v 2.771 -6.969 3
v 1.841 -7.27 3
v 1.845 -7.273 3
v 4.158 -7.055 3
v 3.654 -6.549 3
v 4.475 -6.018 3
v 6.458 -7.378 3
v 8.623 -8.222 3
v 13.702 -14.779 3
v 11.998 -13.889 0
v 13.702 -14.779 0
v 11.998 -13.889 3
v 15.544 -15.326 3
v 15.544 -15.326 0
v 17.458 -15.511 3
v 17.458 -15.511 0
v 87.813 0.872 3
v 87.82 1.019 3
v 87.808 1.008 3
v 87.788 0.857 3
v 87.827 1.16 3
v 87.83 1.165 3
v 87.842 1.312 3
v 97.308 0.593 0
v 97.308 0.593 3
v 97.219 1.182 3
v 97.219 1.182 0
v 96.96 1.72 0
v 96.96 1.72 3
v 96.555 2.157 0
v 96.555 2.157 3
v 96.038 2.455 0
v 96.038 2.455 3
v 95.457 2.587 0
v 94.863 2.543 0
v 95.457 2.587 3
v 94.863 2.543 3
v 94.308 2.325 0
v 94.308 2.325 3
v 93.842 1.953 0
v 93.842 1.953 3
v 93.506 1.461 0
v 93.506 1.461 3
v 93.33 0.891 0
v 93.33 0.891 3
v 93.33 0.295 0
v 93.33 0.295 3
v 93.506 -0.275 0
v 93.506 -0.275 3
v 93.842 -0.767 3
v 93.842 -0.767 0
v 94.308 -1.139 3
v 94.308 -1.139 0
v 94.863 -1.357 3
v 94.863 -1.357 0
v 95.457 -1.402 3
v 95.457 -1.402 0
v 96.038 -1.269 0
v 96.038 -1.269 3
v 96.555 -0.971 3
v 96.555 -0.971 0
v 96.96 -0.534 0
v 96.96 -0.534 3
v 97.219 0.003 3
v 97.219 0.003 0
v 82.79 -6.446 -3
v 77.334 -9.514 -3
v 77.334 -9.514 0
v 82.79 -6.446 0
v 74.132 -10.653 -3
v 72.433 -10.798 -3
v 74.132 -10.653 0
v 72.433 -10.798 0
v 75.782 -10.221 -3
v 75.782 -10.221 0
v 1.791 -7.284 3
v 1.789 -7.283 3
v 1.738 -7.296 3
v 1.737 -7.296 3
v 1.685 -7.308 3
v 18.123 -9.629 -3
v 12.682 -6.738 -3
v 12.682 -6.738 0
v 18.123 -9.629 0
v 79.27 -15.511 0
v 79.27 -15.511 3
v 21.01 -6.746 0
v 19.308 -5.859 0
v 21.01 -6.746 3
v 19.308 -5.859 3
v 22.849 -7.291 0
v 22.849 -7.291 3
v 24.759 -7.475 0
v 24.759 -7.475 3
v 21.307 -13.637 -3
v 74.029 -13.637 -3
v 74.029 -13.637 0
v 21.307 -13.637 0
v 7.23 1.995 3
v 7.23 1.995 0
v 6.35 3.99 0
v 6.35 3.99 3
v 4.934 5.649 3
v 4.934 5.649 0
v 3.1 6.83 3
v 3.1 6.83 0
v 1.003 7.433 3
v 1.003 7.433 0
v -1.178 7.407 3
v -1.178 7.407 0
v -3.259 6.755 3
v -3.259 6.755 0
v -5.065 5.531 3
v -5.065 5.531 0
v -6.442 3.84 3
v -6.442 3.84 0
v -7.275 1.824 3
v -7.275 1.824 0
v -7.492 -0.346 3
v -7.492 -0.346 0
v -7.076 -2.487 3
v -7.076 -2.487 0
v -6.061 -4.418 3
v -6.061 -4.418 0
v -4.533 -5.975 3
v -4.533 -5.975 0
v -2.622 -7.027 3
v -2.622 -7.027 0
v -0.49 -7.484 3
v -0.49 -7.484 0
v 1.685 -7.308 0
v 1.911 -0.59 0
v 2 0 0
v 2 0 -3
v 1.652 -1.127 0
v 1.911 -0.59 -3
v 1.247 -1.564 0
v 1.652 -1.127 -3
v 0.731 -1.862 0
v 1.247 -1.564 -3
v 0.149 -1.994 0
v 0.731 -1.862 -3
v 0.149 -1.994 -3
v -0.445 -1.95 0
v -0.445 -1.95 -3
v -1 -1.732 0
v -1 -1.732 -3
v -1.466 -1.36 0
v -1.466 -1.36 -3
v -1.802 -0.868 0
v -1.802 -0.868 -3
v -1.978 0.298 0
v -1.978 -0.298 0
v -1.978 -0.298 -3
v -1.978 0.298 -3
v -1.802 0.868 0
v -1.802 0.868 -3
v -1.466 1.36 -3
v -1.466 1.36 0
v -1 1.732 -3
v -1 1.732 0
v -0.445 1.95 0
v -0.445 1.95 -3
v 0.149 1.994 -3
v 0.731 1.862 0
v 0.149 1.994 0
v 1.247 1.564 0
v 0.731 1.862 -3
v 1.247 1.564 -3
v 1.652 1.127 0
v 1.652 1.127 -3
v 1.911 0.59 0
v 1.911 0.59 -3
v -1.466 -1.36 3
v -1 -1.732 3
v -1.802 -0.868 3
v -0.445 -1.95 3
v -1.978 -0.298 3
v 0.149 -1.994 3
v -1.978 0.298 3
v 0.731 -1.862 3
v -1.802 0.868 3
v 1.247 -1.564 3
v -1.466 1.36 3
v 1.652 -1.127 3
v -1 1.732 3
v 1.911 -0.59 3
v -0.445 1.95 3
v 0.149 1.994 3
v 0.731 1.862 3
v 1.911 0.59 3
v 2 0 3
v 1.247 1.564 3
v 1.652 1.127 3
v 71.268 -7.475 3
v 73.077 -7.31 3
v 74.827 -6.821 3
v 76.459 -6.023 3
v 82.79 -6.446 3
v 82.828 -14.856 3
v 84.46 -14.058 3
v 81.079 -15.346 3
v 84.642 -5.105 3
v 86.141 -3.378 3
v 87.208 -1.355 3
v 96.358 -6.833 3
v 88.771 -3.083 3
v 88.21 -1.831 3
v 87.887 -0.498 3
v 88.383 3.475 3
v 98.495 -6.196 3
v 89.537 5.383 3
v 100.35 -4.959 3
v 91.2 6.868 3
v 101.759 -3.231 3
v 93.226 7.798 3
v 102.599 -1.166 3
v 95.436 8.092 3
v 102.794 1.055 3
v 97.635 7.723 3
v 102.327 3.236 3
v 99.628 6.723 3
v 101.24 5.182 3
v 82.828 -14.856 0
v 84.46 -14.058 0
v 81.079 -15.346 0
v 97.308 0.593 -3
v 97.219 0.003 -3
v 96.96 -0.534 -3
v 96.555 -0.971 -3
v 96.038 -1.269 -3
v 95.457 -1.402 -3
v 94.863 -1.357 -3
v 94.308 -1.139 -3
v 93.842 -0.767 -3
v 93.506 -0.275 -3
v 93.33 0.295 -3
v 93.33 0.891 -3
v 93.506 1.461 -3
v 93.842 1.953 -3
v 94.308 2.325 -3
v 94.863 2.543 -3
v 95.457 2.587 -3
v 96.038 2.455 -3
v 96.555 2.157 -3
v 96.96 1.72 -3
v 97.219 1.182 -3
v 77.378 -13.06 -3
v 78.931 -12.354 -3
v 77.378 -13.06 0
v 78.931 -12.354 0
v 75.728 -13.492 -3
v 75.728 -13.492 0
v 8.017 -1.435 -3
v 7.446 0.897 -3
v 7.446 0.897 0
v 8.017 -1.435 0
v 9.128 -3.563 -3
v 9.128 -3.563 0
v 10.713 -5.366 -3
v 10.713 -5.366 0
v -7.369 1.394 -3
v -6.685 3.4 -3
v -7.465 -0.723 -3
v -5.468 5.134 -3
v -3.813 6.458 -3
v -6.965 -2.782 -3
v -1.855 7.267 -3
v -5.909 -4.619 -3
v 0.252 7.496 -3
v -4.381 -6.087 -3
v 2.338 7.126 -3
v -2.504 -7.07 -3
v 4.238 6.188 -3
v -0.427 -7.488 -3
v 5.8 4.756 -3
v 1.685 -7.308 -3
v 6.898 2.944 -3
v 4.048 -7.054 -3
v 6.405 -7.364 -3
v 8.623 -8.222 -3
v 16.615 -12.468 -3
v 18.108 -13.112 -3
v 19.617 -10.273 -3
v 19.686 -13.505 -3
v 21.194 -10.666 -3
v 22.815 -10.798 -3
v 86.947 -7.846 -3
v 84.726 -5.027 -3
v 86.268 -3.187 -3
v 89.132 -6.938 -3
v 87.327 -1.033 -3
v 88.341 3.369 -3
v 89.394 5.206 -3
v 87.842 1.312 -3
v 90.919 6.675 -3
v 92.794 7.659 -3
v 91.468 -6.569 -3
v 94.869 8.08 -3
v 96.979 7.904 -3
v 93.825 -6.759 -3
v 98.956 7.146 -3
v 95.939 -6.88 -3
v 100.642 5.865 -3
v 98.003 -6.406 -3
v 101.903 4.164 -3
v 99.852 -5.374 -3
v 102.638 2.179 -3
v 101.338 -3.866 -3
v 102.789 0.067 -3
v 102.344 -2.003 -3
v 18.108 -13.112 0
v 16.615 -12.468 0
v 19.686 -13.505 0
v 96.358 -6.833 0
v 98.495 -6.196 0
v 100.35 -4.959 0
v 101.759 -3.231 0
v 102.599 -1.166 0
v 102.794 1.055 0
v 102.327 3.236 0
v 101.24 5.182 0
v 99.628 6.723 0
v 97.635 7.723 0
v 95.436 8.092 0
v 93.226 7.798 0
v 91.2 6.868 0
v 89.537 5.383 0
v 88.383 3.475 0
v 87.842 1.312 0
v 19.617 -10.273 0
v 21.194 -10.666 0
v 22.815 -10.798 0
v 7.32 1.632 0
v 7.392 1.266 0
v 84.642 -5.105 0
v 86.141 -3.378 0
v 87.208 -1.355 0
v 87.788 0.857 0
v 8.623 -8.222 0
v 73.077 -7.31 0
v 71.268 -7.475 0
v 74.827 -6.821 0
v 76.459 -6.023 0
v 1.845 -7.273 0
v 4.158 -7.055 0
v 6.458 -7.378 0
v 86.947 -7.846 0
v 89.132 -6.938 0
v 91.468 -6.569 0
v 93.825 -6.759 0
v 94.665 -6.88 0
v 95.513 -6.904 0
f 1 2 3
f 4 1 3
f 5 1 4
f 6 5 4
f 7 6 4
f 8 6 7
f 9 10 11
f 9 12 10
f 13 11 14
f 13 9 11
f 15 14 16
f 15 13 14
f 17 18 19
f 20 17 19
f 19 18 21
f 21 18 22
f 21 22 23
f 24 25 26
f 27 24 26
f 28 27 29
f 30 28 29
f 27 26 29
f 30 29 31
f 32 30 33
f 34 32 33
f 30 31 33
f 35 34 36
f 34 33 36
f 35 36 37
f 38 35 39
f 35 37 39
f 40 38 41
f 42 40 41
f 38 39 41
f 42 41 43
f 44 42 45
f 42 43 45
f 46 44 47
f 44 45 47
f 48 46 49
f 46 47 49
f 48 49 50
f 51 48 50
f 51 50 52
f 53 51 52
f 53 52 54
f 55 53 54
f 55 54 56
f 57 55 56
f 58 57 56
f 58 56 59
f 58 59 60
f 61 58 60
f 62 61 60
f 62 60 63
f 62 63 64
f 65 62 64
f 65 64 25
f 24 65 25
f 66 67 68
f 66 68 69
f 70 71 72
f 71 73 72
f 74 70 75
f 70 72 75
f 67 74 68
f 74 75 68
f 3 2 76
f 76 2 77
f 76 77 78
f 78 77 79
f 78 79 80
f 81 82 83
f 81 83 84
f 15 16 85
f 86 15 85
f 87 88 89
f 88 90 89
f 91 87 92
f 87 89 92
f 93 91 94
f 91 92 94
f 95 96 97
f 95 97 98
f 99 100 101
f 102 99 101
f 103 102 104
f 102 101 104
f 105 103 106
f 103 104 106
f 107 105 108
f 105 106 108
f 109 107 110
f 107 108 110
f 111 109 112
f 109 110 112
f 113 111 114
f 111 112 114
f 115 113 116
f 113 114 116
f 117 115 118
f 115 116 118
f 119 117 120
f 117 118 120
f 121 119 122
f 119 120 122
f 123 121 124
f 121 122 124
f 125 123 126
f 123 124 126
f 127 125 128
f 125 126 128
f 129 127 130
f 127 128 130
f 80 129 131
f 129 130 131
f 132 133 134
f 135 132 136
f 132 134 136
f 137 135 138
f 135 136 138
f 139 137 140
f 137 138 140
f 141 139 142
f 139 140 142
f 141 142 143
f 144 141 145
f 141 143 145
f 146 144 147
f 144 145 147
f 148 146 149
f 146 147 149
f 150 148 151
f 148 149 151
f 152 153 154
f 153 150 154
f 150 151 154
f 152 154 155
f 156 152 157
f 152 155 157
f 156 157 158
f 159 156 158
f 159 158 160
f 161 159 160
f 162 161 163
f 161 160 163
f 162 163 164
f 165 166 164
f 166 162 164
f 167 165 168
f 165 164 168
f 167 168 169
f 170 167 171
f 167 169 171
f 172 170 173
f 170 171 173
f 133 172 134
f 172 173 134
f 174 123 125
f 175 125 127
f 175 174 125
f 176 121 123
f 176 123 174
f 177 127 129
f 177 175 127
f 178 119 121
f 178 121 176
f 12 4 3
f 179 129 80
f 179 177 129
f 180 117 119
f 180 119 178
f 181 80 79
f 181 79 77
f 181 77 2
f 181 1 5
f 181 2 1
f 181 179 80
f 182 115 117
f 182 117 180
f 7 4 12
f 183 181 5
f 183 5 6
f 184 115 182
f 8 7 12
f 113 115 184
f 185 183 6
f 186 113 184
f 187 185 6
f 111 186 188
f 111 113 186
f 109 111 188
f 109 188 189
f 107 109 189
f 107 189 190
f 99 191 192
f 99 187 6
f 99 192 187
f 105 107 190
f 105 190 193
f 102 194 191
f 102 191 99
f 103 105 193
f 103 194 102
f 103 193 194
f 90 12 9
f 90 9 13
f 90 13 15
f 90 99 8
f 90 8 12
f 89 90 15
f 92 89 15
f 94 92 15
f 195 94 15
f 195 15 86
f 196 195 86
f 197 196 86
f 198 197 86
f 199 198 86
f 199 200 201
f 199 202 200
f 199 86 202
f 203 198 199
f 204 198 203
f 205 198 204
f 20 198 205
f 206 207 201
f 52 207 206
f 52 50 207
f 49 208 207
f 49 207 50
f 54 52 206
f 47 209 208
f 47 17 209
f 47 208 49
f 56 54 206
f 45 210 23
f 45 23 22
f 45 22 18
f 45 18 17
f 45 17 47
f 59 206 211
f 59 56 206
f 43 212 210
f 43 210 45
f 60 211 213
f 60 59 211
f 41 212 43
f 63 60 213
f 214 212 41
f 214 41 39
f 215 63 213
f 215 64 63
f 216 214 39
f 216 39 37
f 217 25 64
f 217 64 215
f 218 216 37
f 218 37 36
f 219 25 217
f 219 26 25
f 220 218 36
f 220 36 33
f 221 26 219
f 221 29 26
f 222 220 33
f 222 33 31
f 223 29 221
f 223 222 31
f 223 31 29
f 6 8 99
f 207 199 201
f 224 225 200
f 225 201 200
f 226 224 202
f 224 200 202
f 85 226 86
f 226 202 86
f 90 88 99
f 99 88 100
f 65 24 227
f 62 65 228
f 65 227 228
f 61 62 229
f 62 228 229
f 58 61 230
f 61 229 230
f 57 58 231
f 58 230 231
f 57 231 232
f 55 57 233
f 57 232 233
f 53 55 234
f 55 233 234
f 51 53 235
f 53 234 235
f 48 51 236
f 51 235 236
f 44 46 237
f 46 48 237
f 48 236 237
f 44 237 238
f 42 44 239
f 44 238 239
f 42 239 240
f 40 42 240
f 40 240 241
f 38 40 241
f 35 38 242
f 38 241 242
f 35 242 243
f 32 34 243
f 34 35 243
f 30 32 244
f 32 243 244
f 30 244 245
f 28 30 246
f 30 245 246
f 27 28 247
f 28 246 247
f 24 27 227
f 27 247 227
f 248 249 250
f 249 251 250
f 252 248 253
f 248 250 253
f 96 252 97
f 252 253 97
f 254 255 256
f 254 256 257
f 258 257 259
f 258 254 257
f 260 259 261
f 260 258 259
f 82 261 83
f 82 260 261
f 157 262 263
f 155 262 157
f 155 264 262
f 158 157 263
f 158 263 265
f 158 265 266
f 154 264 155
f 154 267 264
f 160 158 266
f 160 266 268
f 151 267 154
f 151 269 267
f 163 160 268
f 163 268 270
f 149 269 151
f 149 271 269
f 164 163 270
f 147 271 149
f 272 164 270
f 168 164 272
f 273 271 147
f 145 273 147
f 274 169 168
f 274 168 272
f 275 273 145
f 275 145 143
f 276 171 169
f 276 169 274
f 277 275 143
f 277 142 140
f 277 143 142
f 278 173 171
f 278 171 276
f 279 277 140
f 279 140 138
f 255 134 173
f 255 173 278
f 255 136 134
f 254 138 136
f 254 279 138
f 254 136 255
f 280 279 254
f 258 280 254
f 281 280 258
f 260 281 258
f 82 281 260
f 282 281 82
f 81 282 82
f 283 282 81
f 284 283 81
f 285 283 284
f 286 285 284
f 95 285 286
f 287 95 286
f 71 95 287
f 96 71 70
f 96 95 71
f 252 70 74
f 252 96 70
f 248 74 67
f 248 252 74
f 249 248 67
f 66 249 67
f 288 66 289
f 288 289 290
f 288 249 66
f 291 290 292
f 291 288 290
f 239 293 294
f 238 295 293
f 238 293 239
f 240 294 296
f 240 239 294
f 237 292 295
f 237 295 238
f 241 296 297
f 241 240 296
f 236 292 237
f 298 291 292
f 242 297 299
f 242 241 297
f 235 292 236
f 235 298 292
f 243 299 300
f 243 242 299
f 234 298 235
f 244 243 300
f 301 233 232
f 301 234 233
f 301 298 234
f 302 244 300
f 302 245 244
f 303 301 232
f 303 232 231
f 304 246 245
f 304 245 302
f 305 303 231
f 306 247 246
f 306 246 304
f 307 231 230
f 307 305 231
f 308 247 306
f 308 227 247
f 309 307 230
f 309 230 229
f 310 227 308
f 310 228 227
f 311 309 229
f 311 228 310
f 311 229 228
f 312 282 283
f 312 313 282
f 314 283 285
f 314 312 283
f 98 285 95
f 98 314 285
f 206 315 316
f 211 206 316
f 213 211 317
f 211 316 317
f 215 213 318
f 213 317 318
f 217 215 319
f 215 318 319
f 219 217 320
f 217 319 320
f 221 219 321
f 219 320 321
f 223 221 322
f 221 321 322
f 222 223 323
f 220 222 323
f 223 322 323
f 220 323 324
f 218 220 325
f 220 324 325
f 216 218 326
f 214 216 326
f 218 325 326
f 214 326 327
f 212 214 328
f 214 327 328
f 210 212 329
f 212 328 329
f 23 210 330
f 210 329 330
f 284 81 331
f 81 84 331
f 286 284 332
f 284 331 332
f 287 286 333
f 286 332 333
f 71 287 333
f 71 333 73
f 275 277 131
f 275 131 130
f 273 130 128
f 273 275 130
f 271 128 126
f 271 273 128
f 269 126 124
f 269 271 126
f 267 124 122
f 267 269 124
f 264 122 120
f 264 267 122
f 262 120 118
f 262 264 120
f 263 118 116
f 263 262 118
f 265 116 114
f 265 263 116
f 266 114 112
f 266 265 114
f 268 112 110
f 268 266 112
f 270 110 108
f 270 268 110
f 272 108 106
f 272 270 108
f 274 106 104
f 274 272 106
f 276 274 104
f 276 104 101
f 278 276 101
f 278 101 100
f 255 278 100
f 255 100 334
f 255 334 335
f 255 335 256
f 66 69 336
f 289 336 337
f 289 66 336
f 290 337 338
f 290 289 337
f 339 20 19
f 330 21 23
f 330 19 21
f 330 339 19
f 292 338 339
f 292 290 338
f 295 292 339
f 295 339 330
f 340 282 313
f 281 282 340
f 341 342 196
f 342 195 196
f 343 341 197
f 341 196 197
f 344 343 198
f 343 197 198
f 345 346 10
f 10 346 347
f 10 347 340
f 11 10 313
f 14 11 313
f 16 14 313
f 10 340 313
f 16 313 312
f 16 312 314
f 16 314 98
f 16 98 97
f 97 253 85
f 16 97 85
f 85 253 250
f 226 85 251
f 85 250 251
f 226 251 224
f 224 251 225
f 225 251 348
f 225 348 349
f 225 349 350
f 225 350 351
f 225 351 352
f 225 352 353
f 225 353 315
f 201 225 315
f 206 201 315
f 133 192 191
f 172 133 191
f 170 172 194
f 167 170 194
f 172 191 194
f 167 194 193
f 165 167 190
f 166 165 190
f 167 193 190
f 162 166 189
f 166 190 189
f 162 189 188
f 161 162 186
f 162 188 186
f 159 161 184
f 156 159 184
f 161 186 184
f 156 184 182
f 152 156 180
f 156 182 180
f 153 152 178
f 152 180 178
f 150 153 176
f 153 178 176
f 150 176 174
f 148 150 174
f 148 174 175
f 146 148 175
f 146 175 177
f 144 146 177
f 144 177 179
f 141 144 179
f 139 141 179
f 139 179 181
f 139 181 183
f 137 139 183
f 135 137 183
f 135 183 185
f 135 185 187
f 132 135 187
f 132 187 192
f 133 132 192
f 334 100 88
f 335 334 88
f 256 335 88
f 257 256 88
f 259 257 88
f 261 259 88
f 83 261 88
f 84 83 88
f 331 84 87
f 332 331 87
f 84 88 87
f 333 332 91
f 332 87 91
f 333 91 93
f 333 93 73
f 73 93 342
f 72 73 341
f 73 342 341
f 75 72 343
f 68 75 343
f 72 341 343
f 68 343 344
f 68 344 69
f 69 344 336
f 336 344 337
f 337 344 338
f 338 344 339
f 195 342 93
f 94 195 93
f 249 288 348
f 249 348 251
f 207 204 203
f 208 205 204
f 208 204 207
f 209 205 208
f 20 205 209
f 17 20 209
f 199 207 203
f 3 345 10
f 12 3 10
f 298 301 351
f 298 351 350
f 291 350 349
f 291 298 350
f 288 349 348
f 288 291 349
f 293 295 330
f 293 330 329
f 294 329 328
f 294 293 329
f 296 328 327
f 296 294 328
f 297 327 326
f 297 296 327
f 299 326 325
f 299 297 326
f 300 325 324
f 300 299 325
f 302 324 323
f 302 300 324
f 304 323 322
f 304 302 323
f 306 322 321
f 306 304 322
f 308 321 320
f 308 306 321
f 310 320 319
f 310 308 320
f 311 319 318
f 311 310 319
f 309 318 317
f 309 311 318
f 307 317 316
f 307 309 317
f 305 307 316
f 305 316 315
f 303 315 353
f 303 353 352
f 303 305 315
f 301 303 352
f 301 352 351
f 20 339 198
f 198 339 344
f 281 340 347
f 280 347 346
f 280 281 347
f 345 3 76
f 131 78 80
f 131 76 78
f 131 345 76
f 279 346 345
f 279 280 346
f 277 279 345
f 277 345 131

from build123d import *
from build123d.topology import SkipClean

# Parameters (mm, degrees)
EXTRUDE_1_DEPTH     = 3
SKETCH_2_R          = 2
SKETCH_2_R_2        = 1.9999999999999967
CUT_EXTRUDE_1_DEPTH = 105.01455903133225
EXTRUDE_START       = 3
SKETCH_3_R          = 1.9999999999999962
SKETCH_3_R_2        = 2
EXTRUDE_9_DEPTH     = 3
FILLET_1_R          = 10
FILLET_2_R          = 10


with BuildPart() as part:
    # 草图1 → 凸台-拉伸1 (new body)
    with BuildSketch(Plane.XY):
        with BuildLine():
            Line((21.79390335077292, -7.475214596472519), (7.229933319640558, 1.9945085092702048))
            ThreePointArc((7.229933319640558, 1.9945085092702048), (-6.483154274799016, 3.7707705643747733), (1.8411668544431816, -7.270495486148093))
            Line((1.8411668544431845, -7.270495486148092), (14.486878939127898, -15.510906506800303))
            Line((14.486878939127898, -15.510906506800302), (82.06831155956868, -15.510906506800302))
            Line((82.06831155956867, -15.510906506800302), (96.3582789784704, -6.83317051644414))
            ThreePointArc((96.35827897847041, -6.833170516444138), (100.33032000817497, 6.162825901013469), (87.812990018917, 0.8723171575890092))
            Line((87.81299001891699, 0.8723171575890003), (74.06678283695699, -7.475214596472519))
            Line((74.06678283695699, -7.475214596472519), (21.79390335077292, -7.475214596472519))
        make_face()
    extrude(amount=EXTRUDE_1_DEPTH)

    # 草图2 → 切除-拉伸1 (cut, through all)
    with BuildSketch(Plane.XY.offset(3)):
        Circle(SKETCH_2_R)
        with Locations((95.30778311888552, 0.5928956325337316)):
            Circle(SKETCH_2_R_2)
    extrude(amount=-CUT_EXTRUDE_1_DEPTH, mode=Mode.SUBTRACT)

    # 草图3 → 凸台-拉伸9 (add)
    # profile 1 of 3: a face of its own
    with SkipClean():  # the faces are left unmerged after this step: merging them gives an invalid solid
        with BuildSketch(Plane(origin=(0, 0, 0), x_dir=(-1, 0, 0), z_dir=(0, 0, -1)).offset(EXTRUDE_START)):
            with BuildLine():
                ThreePointArc((-91.01590945402396, -5.557699496790565), (-89.75367146553334, -4.447128548171897), (-88.77053253167215, -3.0832918980444344))
                ThreePointArc((-88.77053253167215, -3.0832918980444344), (-88.05246164412989, -1.3071860230668506), (-87.80778311888552, 0.5928956325337297))
                ThreePointArc((-87.80778311888552, 0.5928956325337316), (-87.80908495687888, 0.7326306500420054), (-87.812990018917, 0.8723171575890011))
                ThreePointArc((-87.81299001891699, 0.8723171575890014), (-100.33032000817497, 6.162825901013491), (-96.35827897847041, -6.833170516444131))
                ThreePointArc((-96.35827897847042, -6.833170516444138), (-93.56613473312304, -6.702079412000068), (-91.01590945402396, -5.557699496790565))
            make_face()
            with Locations(Location((-95.30778311888552, 0.5928956325337316, 0), (0, 0, 180))):
                Circle(SKETCH_3_R, mode=Mode.SUBTRACT)
        # profile 2 of 3: a face of its own
        with BuildSketch(Plane(origin=(0, 0, 0), x_dir=(-1, 0, 0), z_dir=(0, 0, -1)).offset(EXTRUDE_START)):
            with BuildLine():
                Line((-75.05143042110615, -10.798154811245045), (-88.77053253167215, -3.0832918980444335))
                ThreePointArc((-88.77053253167215, -3.0832918980444344), (-89.75367146553334, -4.447128548171897), (-91.01590945402396, -5.557699496790565))
                Line((-91.01590945402396, -5.557699496790569), (-76.64805579661679, -13.637384335527532))
                Line((-76.64805579661679, -13.637384335527532), (-18.81509472588799, -13.637384335527532))
                Line((-18.81509472588799, -13.637384335527532), (-4.475261433860523, -6.018474482674216))
                ThreePointArc((-4.475261433860524, -6.018474482674214), (-5.688218997555007, -4.8881657741789315), (-6.623200748856248, -3.5189788064650287))
                Line((-6.623200748856245, -3.5189788064650287), (-20.323608343622624, -10.798154811245045))
                Line((-20.323608343622624, -10.798154811245045), (-75.05143042110615, -10.798154811245045))
            make_face()
        # profile 3 of 3: a face of its own
        with BuildSketch(Plane(origin=(0, 0, 0), x_dir=(-1, 0, 0), z_dir=(0, 0, -1)).offset(EXTRUDE_START)):
            with BuildLine():
                ThreePointArc((-7.229933319640558, 1.9945085092702044), (-7.454996074789714, -0.8203862047048063), (-6.623200748856248, -3.5189788064650287))
                ThreePointArc((-6.623200748856248, -3.5189788064650287), (-5.688218997555007, -4.8881657741789315), (-4.475261433860524, -6.018474482674214))
                ThreePointArc((-4.475261433860524, -6.018474482674214), (-3.2196592565993294, -6.773757765922417), (-1.8411668544431843, -7.270495486148093))
                ThreePointArc((-1.8411668544431843, -7.270495486148093), (4.606584884254069, -5.918561962517747), (7.5, -1.84e-15))
                ThreePointArc((7.5, 0), (1.00635483371816, 7.432176662906506), (-7.229933319640558, 1.9945085092702044))
            make_face()
            with Locations(Location((0, 0, 0), (0, 0, 180))):
                Circle(SKETCH_3_R_2, mode=Mode.SUBTRACT)
        extrude(amount=-EXTRUDE_9_DEPTH)

    # 圆角1
    # the kernel refuses this fillet: 10 mm, written as the material it adds along each edge
    with BuildSketch(Plane(origin=(88.77053253167215, -3.083291898044434, -3), x_dir=(-0.20664882712832097, 0.9784151788716738, 0), z_dir=(0, 0, 1))) as fillet_1_piece_1_section:
        with BuildLine():
            CenterArc((7.4864083793494025, 9.541100058820126), FILLET_1_R, 197.4249522895106, 55.15009542096897)
            Line((-2.0546916794712278, 6.546536707082027), (0, 0))
            ThreePointArc((0, 0), (2.245922513804829, 0.34417495588492364), (4.491845027609668, -5e-17))
        make_face()
    fillet_1_piece_1 = extrude(amount=20.153516540869376, mode=Mode.PRIVATE)
    fillet_1_piece_1 = split(fillet_1_piece_1, bisect_by=Plane(origin=(86.96414266235654, -3.033123271198268, 3), z_dir=(0, 0, -1)), keep=Keep.TOP, mode=Mode.PRIVATE)
    add(fillet_1_piece_1)
    with BuildSketch(Plane(origin=(91.01590945402396, -5.557699496790567, -3), x_dir=(0.9194568899378542, -0.39319082841008474, 0), z_dir=(0, 0, 1))) as fillet_1_piece_2:
        with BuildLine():
            CenterArc((5.092784059285759, -9.790309907458374), FILLET_1_R, 101.75407382431756, 40.75010367707175)
            Line((-2.8411931775201964, -3.7032740766253633), (0, 0))
            ThreePointArc((0, 0), (1.5278352177857282, -0.1572675694062238), (3.055670435571466, 9e-17))
        make_face()
    extrude(amount=3)
    with BuildSketch(Plane(origin=(4.475261433860524, -6.018474482674215, -3), x_dir=(-0.9077280584793651, -0.4195590206982592, 0), z_dir=(0, 0, 1))) as fillet_1_piece_3_section:
        with BuildLine():
            CenterArc((5.124050374991801, 9.787699282299565), FILLET_1_R, 217.21105425538934, 40.96167029208499)
            Line((-2.840082184875719, 3.740171475926284), (0, 0))
            ThreePointArc((0, 0), (1.53721511249754, 0.15922553827532712), (3.0744302249950772, 4e-17))
        make_face()
    fillet_1_piece_3 = extrude(amount=14.740674354083392, mode=Mode.PRIVATE)
    fillet_1_piece_3 = split(fillet_1_piece_3, bisect_by=Plane(origin=(4.991537565692553, -6.857429506035165, 3), z_dir=(0, 0, -1)), keep=Keep.TOP, mode=Mode.PRIVATE)
    add(fillet_1_piece_3)
    with BuildSketch(Plane(origin=(6.623200748856247, -3.5189788064650287, -3), x_dir=(0.883093433180833, -0.46919717419533746, 0), z_dir=(0, 0, 1))) as fillet_1_piece_4:
        with BuildLine():
            CenterArc((6.861406616347785, 10.000000000000002), FILLET_1_R, 214.84990457904146, 55.15009542095851)
            ThreePointArc((-1.3451114501356154, 4.285714285715009), (-0.3441749558850217, 2.245922513805171), (0, 0))
            Line((0, 0), (6.861406616347784, -2e-17))
        make_face()
    extrude(amount=3)

    # 圆角2
    fillet_2_edges = [part.edges().sort_by_distance(p)[0] for p in [
        (21.79390335077292, -7.475214596472519, 1.5),
        (74.06678283695699, -7.475214596472519, 1.5),
        (82.06831155956868, -15.510906506800302, 1.5),
        (14.486878939127898, -15.510906506800303, 1.5),
        (76.64805579661679, -13.637384335527532, -1.5),
        (18.81509472588799, -13.637384335527532, -1.5),
        (20.323608343622624, -10.798154811245045, -1.5),
        (75.05143042110615, -10.798154811245045, -1.5),
    ]]
    fillet(fillet_2_edges, radius=FILLET_2_R)


solid = part.part
